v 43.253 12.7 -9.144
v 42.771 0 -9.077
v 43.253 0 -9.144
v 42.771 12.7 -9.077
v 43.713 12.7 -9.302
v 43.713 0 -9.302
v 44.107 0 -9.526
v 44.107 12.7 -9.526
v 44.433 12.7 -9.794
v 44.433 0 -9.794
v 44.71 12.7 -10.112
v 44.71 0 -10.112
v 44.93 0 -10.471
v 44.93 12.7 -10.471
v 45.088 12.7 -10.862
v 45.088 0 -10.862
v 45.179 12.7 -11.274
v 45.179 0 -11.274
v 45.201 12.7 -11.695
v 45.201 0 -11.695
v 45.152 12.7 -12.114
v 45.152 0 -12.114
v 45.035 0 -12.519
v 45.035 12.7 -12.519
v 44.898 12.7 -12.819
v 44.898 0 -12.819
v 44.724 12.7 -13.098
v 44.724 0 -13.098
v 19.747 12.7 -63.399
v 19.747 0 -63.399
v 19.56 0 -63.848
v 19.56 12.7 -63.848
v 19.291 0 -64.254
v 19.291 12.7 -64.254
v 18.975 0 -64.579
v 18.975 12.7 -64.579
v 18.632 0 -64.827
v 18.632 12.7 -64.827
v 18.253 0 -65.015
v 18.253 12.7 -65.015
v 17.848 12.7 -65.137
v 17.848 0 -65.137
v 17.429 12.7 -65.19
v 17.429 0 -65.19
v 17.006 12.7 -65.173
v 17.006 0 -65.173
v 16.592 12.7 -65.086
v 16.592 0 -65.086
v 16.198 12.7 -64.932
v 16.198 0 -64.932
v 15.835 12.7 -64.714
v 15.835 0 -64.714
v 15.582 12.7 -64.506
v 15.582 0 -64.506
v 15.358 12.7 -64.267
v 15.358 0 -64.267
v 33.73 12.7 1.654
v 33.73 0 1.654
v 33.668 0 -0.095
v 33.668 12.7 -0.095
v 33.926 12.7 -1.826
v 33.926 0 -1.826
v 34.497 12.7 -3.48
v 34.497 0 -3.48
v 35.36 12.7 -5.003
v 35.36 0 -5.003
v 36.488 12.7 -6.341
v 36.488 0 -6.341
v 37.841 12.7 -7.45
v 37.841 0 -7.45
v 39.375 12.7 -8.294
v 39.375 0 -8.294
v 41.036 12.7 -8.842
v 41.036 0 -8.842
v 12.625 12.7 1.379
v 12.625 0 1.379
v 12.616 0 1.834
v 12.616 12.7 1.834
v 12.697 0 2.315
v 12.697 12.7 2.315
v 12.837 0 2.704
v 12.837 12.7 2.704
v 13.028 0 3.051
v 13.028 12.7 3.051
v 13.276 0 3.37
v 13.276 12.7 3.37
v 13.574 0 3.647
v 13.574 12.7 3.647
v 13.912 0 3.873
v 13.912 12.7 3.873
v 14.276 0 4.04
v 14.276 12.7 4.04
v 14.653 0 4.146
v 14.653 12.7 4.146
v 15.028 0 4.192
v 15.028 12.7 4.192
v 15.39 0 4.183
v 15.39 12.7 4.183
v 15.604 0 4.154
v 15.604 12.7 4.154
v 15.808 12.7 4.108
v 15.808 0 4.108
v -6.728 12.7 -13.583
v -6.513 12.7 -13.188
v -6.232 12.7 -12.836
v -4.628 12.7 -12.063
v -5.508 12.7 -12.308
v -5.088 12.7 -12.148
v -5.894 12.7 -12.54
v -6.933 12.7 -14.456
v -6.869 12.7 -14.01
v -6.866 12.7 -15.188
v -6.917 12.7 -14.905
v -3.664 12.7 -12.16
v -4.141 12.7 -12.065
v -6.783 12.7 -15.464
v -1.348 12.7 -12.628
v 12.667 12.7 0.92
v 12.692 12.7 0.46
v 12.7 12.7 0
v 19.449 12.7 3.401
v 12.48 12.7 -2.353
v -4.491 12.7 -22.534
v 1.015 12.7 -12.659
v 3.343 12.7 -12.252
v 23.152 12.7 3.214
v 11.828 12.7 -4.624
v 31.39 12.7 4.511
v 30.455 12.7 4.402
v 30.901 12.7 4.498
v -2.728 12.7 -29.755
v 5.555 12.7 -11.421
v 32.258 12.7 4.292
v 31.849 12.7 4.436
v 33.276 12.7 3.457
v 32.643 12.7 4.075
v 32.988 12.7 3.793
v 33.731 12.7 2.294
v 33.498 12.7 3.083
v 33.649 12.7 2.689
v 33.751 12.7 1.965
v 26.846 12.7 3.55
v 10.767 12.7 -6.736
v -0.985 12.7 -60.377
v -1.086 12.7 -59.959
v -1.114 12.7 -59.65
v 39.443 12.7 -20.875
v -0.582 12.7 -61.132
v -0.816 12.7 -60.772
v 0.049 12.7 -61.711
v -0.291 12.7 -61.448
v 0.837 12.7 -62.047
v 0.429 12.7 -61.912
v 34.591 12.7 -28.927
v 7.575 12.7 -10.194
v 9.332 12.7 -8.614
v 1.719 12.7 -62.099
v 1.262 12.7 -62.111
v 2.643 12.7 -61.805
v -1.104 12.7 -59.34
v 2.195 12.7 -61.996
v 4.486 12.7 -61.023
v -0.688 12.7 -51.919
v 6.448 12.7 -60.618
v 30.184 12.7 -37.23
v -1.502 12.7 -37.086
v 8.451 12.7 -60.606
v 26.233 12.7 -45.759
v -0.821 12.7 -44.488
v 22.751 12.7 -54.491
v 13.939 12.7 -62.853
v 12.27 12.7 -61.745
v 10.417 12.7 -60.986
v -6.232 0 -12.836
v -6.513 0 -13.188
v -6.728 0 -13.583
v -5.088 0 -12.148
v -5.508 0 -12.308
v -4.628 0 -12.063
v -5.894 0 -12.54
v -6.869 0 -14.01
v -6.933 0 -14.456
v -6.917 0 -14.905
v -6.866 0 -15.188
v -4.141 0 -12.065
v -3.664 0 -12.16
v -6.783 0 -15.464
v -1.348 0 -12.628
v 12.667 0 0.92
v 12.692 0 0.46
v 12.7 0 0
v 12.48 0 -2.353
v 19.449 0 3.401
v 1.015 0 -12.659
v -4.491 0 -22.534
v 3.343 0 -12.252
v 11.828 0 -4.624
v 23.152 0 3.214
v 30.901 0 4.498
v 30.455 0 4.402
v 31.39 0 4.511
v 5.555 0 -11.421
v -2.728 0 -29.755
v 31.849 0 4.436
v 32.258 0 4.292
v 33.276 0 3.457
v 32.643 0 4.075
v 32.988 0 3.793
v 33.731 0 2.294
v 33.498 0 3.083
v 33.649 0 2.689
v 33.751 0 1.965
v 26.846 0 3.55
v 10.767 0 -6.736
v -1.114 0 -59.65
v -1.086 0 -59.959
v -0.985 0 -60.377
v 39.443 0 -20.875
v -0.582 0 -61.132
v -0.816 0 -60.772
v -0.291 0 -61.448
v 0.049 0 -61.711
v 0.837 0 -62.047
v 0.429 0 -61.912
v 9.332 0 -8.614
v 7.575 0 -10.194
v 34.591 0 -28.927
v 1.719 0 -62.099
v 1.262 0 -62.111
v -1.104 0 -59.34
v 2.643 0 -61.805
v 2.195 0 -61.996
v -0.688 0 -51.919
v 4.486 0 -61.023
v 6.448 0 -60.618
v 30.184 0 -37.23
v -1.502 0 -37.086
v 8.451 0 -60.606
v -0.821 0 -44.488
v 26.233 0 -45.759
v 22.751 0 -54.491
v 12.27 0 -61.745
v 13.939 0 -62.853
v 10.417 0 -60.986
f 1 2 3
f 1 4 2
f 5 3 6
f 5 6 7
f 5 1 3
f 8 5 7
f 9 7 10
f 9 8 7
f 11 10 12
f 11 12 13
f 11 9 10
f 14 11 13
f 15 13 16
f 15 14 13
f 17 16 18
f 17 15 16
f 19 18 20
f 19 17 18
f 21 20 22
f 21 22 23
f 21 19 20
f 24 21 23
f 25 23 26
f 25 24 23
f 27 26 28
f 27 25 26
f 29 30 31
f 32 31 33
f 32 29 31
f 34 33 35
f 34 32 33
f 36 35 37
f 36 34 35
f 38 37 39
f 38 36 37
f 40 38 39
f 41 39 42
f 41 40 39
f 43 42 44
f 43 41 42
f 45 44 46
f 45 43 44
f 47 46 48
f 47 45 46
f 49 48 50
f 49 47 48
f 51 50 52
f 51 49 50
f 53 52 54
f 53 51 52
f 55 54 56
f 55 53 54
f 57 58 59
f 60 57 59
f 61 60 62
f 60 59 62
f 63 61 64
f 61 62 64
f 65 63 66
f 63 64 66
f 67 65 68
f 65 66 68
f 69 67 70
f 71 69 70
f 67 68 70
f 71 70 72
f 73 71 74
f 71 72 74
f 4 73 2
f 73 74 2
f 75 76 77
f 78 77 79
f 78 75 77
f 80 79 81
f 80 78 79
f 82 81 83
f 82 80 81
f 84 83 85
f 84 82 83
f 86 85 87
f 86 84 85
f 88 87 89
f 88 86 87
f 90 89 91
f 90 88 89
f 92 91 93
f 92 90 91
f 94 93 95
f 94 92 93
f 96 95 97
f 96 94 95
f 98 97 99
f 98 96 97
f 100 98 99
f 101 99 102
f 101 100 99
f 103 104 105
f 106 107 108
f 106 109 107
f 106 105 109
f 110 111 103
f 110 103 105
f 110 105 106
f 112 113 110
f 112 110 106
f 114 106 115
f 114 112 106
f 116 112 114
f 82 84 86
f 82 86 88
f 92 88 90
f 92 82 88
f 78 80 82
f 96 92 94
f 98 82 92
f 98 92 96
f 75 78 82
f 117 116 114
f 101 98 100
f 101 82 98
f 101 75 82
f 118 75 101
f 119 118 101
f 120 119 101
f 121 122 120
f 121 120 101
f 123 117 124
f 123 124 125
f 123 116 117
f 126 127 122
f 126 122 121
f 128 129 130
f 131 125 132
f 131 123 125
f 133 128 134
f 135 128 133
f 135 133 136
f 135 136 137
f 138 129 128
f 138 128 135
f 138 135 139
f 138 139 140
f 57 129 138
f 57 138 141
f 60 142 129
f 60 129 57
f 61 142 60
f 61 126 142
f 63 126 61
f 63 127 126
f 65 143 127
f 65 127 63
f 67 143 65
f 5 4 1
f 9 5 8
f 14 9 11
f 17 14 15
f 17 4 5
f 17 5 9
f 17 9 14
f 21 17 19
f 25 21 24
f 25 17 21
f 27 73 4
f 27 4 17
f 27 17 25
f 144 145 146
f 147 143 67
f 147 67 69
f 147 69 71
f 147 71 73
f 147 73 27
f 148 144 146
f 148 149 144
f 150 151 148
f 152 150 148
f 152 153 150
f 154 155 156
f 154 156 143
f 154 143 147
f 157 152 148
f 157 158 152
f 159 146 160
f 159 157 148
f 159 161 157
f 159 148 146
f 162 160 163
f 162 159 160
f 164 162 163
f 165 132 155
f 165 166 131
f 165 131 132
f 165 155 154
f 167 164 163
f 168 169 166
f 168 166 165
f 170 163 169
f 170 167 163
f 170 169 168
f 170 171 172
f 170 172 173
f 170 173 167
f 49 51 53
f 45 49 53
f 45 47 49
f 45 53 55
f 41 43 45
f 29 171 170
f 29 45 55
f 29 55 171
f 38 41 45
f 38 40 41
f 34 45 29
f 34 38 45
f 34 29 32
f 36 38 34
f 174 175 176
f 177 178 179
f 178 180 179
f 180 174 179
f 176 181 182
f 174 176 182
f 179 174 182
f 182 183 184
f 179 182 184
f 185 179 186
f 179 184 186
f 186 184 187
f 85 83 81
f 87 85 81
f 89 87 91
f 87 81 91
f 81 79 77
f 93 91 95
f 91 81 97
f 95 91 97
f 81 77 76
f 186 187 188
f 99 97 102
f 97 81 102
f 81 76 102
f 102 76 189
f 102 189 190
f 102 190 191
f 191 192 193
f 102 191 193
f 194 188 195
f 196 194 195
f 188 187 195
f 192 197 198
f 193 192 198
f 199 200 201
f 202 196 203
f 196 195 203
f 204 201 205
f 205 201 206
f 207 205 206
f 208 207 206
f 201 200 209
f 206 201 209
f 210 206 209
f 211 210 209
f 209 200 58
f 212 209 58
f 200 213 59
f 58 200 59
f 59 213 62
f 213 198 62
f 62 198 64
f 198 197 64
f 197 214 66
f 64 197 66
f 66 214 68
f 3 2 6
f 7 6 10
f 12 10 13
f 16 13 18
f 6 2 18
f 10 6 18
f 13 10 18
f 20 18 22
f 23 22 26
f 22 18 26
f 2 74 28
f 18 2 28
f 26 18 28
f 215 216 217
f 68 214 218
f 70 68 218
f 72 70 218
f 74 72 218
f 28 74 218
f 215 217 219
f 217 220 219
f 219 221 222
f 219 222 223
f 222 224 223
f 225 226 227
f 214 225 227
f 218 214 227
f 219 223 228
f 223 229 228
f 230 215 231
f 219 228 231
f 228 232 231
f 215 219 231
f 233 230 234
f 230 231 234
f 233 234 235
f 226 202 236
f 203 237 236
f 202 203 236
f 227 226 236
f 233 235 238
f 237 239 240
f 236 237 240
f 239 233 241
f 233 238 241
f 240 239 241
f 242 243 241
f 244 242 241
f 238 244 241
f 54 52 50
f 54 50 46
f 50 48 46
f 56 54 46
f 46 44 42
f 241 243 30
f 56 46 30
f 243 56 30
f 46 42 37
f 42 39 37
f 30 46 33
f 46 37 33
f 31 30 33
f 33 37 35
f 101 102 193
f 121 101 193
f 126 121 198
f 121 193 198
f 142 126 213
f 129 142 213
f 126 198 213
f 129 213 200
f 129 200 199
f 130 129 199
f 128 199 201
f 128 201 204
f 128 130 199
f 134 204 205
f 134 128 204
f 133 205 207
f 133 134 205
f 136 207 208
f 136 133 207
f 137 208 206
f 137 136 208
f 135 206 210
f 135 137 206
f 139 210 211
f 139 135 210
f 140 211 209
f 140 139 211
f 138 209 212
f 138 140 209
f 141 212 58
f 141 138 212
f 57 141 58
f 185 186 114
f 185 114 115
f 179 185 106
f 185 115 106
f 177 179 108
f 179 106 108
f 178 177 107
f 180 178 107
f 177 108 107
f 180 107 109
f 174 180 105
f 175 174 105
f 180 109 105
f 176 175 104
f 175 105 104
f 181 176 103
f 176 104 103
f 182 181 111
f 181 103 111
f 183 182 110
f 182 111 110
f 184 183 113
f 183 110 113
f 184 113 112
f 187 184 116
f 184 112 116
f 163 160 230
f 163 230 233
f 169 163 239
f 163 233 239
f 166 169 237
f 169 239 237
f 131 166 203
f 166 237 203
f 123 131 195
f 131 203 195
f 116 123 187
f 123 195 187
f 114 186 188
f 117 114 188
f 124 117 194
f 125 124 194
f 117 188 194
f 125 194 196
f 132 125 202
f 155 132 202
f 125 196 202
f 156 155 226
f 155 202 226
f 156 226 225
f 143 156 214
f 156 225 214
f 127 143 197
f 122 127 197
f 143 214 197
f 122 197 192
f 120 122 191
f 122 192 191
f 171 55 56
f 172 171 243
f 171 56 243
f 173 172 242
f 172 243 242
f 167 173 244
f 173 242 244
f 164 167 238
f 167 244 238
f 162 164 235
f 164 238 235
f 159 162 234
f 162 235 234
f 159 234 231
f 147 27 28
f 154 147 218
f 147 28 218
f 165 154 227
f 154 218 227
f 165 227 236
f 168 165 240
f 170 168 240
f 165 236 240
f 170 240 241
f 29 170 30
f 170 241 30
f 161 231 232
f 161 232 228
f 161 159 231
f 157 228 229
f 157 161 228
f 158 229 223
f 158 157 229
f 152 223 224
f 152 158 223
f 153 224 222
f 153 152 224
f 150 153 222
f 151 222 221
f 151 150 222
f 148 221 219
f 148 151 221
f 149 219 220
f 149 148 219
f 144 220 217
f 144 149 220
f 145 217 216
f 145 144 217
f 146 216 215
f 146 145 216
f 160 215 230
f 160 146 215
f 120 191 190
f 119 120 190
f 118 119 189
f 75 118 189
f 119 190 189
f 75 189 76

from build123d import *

# Parameters (mm, degrees)
BOSS_EXTRUDE1_DEPTH = 12.7
FILLET1_R           = 2.54


with BuildPart() as part:
    # Sketch1 → Boss-Extrude1 (new body)
    with BuildSketch(Plane(origin=(0, 0, 0), x_dir=(1, 0, 0), z_dir=(0, 1, 0))):
        with BuildLine():
            ThreePointArc((-9.841918443, 8.026620793), (4.260142942, 11.964162408), (12.7, 0))
            ThreePointArc((12.7, 0), (12.349099919, -2.964748082), (11.315790364, -5.765664614))
            ThreePointArc((11.315790364, -5.765664614), (23.993952322, -3.244561181), (36.340951501, -7.071226105))
            ThreePointArc((36.340951501, -7.071226105), (36.414038972, 6.267321996), (49.751485572, 6.453669581))
            ThreePointArc((49.751485572, 6.453669581), (30.344153641, 36.906923092), (17.672267645, 70.722133981))
            ThreePointArc((17.672267645, 70.722133981), (8.792640174, 60.643133724), (-2.325024911, 68.181804248))
            ThreePointArc((-2.325024911, 68.181804248), (-1.446618844, 37.524798959), (-9.841918443, 8.026620793))
        make_face()
    extrude(amount=BOSS_EXTRUDE1_DEPTH)

    # Fillet1
    fillet1_edges = [part.edges().sort_by_distance(p)[0] for p in [
        (-9.841918443, 6.35, -8.026620793),
        (-2.325024911, 6.35, -68.181804248),
        (17.672267645, 6.35, -70.722133981),
        (49.751485572, 6.35, -6.453669581),
        (36.340951501, 6.35, 7.071226105),
        (11.315790364, 6.35, 5.765664614),
    ]]
    fillet(fillet1_edges, radius=FILLET1_R)


solid = part.part
